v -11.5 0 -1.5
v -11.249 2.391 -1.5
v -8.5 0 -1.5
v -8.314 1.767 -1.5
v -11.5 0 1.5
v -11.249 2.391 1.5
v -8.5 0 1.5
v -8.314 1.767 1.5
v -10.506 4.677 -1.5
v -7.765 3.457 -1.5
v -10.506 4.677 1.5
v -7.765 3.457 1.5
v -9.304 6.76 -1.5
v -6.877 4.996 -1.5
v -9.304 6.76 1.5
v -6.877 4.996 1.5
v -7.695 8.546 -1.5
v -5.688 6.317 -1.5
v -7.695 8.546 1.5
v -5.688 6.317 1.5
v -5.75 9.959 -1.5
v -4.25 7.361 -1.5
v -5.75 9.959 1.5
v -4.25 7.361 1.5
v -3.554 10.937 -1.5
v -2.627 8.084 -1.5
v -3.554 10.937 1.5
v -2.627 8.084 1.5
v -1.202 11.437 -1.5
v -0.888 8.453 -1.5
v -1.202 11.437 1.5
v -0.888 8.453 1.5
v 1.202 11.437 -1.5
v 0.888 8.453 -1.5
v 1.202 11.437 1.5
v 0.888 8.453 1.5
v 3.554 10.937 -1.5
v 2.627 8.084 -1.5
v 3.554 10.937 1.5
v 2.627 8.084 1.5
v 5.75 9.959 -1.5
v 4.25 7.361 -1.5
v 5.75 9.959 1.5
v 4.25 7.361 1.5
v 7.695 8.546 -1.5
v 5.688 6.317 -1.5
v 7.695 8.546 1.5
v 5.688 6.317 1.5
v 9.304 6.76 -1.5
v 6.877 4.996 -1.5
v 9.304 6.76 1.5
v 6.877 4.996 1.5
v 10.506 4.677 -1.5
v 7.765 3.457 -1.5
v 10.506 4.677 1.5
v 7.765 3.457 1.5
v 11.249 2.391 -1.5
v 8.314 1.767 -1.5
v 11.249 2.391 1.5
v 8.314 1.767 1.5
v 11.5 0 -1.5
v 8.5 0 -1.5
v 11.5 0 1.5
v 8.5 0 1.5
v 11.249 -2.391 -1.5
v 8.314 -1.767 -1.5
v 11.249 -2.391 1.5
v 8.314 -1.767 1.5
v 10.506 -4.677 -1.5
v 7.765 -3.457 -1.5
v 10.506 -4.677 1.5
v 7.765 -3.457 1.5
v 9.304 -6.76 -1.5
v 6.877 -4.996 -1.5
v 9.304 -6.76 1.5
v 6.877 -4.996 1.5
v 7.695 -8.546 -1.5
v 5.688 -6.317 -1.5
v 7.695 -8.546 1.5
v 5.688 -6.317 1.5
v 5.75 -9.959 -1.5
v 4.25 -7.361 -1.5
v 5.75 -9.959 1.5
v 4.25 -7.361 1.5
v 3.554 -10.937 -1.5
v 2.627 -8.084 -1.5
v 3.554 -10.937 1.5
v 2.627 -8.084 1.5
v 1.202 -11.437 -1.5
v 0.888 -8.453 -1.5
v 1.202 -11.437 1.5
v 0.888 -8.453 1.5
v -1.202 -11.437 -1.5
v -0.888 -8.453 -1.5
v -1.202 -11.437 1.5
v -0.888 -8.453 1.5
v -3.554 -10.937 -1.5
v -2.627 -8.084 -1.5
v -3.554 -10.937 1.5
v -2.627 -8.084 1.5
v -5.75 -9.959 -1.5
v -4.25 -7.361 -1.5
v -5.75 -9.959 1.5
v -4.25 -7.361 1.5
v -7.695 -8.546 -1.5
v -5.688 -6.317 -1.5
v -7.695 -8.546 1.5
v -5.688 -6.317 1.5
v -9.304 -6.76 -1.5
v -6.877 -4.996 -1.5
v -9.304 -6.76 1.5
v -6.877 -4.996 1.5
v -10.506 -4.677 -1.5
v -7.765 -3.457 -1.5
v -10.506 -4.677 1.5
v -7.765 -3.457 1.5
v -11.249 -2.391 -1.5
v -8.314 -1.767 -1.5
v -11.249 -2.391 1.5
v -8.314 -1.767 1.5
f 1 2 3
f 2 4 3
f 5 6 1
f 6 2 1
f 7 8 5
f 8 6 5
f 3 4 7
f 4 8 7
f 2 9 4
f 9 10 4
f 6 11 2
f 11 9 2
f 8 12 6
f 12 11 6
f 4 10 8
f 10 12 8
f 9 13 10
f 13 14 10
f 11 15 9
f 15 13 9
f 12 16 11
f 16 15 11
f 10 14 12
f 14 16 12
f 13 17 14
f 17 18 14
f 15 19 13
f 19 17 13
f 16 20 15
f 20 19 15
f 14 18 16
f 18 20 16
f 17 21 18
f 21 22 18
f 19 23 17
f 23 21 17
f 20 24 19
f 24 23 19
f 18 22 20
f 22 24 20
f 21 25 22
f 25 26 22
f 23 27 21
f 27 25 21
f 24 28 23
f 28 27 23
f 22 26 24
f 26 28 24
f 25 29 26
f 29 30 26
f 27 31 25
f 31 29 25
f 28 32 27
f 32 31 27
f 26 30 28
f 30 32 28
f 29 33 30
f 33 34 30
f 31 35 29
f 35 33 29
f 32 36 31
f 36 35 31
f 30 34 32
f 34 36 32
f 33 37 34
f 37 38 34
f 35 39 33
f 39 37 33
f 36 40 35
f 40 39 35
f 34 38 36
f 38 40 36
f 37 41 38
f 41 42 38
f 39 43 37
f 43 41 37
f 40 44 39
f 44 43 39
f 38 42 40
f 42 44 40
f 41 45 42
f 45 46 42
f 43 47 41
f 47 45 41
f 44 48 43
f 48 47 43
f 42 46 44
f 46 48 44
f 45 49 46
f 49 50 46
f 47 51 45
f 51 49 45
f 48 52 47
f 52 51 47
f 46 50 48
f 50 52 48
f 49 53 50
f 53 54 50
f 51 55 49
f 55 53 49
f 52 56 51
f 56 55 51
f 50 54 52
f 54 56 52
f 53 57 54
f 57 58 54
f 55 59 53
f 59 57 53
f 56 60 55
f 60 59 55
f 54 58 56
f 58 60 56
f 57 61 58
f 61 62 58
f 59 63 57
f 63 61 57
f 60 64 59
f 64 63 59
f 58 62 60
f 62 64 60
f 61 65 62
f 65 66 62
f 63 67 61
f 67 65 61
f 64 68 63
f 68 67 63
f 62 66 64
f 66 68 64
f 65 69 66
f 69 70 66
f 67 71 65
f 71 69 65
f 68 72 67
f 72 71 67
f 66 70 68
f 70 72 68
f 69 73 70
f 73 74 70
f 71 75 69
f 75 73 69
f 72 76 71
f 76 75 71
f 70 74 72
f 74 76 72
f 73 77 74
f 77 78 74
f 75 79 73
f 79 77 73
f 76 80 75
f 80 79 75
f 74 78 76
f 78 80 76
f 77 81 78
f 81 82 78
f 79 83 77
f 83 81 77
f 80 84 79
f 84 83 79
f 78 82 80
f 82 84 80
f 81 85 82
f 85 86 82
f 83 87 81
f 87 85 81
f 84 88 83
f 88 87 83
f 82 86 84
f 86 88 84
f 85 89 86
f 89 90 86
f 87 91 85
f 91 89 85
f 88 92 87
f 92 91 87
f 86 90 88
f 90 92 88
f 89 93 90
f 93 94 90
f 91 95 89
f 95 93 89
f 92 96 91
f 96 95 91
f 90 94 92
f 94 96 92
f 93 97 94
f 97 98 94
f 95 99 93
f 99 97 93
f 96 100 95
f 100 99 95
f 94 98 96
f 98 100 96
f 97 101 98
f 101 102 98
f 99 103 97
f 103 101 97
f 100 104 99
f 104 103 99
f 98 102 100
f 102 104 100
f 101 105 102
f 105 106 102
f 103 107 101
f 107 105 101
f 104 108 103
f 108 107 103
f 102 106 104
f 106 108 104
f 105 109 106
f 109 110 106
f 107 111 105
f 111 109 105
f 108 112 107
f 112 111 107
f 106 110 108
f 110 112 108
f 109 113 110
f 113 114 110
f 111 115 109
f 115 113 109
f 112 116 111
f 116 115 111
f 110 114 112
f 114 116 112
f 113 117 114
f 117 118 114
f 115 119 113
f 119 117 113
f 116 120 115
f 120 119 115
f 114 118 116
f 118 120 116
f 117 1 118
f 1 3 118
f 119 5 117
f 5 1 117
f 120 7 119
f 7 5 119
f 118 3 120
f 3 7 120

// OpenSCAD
// Rotate extrude a square to make a torus-like shape
rotate_extrude() translate([10, 0]) square([3, 3], center=true);
